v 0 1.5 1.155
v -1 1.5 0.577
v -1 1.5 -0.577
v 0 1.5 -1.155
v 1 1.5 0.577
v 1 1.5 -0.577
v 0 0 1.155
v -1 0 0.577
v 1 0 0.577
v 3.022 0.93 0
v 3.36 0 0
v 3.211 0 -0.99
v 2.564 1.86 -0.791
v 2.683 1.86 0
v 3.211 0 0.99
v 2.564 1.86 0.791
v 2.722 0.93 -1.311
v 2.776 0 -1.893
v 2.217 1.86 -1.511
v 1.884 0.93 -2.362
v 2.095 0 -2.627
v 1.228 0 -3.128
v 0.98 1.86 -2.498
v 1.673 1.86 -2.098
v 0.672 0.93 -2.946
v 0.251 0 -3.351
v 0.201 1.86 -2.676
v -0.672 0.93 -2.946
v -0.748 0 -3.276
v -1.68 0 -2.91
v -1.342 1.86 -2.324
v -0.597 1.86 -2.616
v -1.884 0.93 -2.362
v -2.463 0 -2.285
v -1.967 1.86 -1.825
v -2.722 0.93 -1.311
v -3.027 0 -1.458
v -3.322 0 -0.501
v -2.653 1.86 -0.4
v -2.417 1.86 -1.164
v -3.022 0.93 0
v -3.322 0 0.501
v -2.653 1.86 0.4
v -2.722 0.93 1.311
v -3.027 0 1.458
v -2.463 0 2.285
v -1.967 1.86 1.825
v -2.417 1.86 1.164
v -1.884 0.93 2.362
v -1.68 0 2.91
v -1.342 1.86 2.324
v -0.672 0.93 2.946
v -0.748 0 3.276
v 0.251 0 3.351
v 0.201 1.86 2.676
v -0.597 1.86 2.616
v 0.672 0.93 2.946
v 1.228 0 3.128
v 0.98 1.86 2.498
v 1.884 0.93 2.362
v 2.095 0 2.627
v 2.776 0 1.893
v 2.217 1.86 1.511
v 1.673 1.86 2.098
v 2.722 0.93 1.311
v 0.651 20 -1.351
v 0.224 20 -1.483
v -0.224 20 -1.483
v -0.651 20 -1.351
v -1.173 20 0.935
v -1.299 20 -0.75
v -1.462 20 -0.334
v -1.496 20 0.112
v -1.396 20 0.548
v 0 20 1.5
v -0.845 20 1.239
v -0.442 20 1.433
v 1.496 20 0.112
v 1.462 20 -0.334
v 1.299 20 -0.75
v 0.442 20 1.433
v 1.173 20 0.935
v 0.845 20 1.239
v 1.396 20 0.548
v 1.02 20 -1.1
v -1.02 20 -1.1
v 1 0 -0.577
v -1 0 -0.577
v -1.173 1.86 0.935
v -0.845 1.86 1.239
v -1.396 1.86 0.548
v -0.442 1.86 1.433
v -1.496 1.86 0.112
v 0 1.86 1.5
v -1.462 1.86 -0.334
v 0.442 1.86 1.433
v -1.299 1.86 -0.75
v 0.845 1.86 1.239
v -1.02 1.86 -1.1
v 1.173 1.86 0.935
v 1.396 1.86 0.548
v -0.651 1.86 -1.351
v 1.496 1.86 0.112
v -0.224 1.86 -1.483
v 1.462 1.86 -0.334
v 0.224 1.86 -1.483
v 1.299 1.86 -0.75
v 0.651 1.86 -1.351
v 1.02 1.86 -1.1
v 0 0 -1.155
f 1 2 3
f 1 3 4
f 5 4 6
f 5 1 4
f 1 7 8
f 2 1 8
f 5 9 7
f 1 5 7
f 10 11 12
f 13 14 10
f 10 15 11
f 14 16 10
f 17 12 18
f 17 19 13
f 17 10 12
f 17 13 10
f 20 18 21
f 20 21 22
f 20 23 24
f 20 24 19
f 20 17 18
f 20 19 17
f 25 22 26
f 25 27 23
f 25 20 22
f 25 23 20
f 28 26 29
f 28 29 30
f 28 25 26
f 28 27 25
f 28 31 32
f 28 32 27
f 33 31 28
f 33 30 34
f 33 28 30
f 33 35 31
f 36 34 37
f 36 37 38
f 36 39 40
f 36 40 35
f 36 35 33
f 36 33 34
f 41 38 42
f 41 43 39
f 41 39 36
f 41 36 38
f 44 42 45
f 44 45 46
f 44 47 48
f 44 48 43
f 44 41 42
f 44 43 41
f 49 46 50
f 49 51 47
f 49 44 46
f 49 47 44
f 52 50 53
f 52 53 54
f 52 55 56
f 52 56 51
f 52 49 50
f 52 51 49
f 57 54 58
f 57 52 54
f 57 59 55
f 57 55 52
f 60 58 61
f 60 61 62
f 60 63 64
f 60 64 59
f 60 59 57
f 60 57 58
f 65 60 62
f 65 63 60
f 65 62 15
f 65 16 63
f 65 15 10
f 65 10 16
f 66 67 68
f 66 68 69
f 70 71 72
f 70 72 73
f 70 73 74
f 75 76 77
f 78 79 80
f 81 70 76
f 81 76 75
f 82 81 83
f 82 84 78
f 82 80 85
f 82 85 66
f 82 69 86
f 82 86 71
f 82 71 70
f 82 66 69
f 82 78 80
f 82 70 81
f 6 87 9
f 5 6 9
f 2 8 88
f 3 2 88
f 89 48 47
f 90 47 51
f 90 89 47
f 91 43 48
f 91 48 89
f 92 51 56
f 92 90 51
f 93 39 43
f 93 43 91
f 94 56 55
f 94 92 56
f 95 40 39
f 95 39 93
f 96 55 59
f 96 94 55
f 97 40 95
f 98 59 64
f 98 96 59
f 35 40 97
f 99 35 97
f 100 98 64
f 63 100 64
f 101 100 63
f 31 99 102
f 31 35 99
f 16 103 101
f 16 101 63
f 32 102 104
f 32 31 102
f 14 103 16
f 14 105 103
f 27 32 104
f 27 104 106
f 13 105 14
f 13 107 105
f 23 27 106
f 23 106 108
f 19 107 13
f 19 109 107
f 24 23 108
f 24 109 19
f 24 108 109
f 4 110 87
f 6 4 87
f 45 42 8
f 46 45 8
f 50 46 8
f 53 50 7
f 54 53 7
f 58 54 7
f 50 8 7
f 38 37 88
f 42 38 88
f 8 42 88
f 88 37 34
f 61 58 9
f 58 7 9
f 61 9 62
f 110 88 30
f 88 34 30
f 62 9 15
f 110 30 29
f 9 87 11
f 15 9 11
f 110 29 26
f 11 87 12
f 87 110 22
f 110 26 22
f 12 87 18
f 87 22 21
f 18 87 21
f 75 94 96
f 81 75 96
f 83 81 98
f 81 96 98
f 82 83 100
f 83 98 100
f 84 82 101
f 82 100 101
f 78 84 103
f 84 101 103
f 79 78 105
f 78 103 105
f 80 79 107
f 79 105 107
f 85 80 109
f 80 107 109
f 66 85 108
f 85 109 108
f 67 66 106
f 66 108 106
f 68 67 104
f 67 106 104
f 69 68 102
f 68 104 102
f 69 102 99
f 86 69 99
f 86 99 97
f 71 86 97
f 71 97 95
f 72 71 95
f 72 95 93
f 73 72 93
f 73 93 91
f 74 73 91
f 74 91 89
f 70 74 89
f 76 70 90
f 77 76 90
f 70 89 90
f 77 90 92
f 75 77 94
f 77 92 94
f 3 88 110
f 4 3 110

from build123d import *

# Parameters (mm, degrees)
SKETCH1_R           = 3.36
BOSS_EXTRUDE1_DEPTH = 1.86
BOSS_EXTRUDE1_TAPER = 20
SKETCH2_R           = 1.5
BOSS_EXTRUDE2_DEPTH = 18.14
CUT_EXTRUDE1_DEPTH  = 1.5


with BuildPart() as part:
    # Sketch1 → Boss-Extrude1 (new body)
    with BuildSketch(Plane(origin=(0, 0, 0), x_dir=(1, 0, 0), z_dir=(0, 1, 0))):
        Circle(SKETCH1_R)
    extrude(amount=BOSS_EXTRUDE1_DEPTH, taper=BOSS_EXTRUDE1_TAPER)

    # Sketch2 → Boss-Extrude2 (add)
    with BuildSketch(Plane(origin=(0, 1.86, 0), x_dir=(1, 0, 0), z_dir=(0, 1, 0))):
        with Locations(Location((0, 0, 0), (0, 0, 270))):
            Circle(SKETCH2_R)
    extrude(amount=BOSS_EXTRUDE2_DEPTH)

    # Sketch3 → Cut-Extrude1 (cut)
    with BuildSketch(Plane.XZ):
        Polygon((0, 1.154700538), (-1, 0.577350269), (-1, -0.577350269), (0, -1.154700538), (1, -0.577350269), (1, 0.577350269), align=None)
    extrude(amount=-CUT_EXTRUDE1_DEPTH, mode=Mode.SUBTRACT)


solid = part.part
